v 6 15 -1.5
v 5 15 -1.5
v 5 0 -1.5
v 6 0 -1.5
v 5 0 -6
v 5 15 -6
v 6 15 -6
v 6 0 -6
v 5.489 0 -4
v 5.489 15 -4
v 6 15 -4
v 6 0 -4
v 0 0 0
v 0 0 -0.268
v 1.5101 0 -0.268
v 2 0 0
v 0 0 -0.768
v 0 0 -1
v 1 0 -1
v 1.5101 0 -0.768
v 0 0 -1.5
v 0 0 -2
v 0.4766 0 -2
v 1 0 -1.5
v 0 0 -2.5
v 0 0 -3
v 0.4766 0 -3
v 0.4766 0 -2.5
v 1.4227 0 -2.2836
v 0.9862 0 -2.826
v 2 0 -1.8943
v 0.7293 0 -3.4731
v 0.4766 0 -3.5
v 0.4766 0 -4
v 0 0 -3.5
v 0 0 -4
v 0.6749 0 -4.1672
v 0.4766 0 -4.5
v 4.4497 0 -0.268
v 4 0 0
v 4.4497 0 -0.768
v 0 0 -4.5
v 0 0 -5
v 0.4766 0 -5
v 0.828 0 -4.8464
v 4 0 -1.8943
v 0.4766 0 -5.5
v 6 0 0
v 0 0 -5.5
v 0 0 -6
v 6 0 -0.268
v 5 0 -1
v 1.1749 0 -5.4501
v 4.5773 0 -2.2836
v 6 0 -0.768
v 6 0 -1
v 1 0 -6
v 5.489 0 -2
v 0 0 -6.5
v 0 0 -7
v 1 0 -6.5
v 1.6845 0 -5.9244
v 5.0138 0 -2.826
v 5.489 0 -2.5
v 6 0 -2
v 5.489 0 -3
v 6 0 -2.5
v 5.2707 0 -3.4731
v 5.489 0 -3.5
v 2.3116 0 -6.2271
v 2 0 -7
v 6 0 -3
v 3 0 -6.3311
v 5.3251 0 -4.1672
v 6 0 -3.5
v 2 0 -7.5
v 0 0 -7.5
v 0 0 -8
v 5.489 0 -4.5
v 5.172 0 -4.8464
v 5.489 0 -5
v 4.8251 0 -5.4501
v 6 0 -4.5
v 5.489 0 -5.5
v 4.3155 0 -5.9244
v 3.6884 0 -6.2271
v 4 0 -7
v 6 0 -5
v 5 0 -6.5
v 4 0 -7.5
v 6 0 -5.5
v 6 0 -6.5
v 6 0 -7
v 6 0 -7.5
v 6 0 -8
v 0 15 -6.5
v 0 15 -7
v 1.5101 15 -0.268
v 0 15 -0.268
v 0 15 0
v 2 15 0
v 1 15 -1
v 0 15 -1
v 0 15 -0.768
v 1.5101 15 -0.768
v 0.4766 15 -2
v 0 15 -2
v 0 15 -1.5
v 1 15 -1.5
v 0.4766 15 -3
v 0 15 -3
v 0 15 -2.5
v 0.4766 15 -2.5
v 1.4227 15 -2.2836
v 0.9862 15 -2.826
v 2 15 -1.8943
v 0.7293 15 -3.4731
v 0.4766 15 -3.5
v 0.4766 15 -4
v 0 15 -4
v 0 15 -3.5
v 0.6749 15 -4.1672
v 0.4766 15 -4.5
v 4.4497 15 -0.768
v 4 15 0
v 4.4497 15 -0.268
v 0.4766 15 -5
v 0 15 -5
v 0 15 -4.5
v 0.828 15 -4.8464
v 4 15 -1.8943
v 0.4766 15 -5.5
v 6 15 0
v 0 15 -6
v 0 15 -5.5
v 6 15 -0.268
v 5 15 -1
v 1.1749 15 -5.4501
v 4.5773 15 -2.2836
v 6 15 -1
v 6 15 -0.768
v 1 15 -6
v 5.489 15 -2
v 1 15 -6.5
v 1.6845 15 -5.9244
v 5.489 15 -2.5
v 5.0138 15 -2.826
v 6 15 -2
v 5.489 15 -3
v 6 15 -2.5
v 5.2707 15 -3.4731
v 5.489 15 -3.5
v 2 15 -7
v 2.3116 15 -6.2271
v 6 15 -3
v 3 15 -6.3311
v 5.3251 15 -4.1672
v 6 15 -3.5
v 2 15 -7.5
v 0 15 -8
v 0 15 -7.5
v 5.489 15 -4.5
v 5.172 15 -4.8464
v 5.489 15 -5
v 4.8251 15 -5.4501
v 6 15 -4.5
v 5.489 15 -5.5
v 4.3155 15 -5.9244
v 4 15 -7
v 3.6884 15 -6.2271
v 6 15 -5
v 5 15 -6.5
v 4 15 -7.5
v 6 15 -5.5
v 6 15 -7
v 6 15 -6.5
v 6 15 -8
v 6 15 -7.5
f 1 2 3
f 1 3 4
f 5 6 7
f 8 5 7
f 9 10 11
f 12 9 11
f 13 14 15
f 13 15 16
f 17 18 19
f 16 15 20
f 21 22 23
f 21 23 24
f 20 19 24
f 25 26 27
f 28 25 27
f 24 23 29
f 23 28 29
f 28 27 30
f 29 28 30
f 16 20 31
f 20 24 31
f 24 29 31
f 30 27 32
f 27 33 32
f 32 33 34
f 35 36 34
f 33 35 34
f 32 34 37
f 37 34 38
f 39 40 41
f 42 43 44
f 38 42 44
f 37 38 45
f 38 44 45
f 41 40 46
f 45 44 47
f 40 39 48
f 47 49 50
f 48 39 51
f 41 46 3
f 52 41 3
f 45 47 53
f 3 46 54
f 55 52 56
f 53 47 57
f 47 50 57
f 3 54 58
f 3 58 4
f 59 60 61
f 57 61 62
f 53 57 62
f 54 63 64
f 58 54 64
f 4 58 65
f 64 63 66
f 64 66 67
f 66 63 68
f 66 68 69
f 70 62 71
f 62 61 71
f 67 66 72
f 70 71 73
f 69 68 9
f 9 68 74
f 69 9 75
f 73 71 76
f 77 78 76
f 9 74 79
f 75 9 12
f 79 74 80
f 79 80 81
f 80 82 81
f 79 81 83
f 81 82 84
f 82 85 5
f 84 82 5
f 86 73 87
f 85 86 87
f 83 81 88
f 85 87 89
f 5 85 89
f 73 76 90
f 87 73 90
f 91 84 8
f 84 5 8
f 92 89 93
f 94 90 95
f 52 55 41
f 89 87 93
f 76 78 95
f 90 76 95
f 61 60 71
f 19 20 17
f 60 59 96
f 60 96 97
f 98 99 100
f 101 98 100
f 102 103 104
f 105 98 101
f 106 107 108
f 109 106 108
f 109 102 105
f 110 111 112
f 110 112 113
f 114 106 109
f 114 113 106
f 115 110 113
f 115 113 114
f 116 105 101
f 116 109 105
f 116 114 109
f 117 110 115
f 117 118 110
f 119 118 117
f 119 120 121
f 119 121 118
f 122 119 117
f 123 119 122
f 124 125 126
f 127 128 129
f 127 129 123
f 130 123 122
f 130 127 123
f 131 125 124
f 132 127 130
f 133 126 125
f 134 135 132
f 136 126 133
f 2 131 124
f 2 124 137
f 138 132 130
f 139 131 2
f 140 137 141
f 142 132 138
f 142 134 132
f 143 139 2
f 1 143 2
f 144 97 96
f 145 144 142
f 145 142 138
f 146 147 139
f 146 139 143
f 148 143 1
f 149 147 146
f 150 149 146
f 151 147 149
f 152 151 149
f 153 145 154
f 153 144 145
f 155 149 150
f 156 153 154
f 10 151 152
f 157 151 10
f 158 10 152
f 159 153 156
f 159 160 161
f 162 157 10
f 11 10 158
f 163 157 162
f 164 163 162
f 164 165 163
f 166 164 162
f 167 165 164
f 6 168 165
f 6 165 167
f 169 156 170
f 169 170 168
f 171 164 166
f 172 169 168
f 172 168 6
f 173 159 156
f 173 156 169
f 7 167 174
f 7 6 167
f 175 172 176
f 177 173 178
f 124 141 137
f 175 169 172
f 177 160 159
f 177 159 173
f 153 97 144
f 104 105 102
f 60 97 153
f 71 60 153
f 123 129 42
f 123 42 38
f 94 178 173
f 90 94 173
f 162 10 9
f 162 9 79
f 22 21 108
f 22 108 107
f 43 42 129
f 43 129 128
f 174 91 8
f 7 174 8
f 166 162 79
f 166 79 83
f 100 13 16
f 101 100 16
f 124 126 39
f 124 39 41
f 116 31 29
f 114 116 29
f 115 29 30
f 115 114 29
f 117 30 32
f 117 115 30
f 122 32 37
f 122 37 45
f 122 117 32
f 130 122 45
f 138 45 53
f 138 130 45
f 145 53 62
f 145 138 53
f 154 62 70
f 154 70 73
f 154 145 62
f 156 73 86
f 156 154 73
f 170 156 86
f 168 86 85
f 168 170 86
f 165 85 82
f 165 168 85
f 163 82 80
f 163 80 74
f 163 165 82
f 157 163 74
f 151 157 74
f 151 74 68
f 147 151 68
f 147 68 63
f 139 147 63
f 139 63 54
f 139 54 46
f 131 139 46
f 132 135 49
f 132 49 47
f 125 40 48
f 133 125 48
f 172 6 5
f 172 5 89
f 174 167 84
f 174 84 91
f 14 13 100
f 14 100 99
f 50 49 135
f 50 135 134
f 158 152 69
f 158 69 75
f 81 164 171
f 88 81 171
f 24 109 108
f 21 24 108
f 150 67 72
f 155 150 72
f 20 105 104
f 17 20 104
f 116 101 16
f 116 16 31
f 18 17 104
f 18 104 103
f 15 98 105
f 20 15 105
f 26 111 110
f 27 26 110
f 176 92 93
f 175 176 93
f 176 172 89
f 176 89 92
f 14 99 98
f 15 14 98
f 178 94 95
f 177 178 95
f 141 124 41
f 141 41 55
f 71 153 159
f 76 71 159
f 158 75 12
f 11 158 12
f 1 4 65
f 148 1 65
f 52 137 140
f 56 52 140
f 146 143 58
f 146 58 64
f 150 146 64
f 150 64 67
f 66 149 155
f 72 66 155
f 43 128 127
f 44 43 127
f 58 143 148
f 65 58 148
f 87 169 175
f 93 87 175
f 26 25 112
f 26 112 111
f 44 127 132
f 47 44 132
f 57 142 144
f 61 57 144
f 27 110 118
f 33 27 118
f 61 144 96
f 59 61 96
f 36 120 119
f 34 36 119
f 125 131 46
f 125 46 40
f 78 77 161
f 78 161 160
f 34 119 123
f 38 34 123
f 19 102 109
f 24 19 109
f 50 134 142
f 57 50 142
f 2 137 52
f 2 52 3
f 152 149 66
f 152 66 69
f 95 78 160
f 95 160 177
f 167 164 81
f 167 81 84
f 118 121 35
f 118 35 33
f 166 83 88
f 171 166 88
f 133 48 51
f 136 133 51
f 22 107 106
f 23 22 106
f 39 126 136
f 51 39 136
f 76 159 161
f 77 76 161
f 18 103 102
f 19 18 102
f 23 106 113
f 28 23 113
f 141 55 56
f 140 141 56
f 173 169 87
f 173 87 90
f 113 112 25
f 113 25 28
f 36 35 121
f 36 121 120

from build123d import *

# Parameters (mm, degrees)
SKETCH1_W           = 6
SKETCH1_H           = 8
BOSS_EXTRUDE1_DEPTH = 15
CUT_EXTRUDE2_DEPTH  = 15
SKETCH3_W           = 1.55025835
SKETCH3_H           = 0.5
SKETCH3_W_2         = 0.44974165
SKETCH3_W_3         = 1
SKETCH3_W_4         = 0.511037603
SKETCH3_W_5         = 1.033479195
SKETCH3_W_6         = 0.476588297
SKETCH3_W_7         = 0.523411703
SKETCH3_W_8         = 0.489932508
CUT_EXTRUDE3_DEPTH  = 15


with BuildPart() as part:
    # Sketch1 → Boss-Extrude1 (new body)
    with BuildSketch(Plane(origin=(0, 0, 0), x_dir=(1, 0, 0), z_dir=(0, 1, 0))):
        with Locations((3, 4)):
            Rectangle(SKETCH1_W, SKETCH1_H)
    extrude(amount=BOSS_EXTRUDE1_DEPTH)

    # Sketch2 → Cut-Extrude2 (cut)
    with BuildSketch(Plane(origin=(0, 15, 0), x_dir=(1, 0, 0), z_dir=(0, 1, 0))):
        with BuildLine():
            Line((4, 0), (2, 0))
            Line((2, 0), (2, 1.894320503))
            ThreePointArc((2, 1.894320503), (3, 6.331069742), (4, 1.894320503))
            Line((4, 1.894320503), (4, 0))
        make_face()
    extrude(amount=-CUT_EXTRUDE2_DEPTH, mode=Mode.SUBTRACT)

    # Sketch3 → Cut-Extrude3 (cut)
    with BuildSketch(Plane(origin=(0, 15, 0), x_dir=(1, 0, 0), z_dir=(0, 1, 0))):
        with Locations((5.224870825, 7.25)):
            Rectangle(SKETCH3_W, SKETCH3_H)
        with Locations((4.224870825, 7.25)):
            Rectangle(SKETCH3_W_2, SKETCH3_H)
        with Locations((5.5, 6.25)):
            Rectangle(SKETCH3_W_3, SKETCH3_H)
        with Locations((5.744481199, 5.25)):
            Rectangle(SKETCH3_W_4, SKETCH3_H)
        with Locations((5.744481199, 4.25)):
            Rectangle(SKETCH3_W_4, SKETCH3_H)
        with Locations((5.744481199, 3.25)):
            Rectangle(SKETCH3_W_4, SKETCH3_H)
        with Locations((5.744481199, 2.25)):
            Rectangle(SKETCH3_W_4, SKETCH3_H)
        with Locations((5.5, 1.25)):
            Rectangle(SKETCH3_W_3, SKETCH3_H)
        with Locations((5.224870825, 0.517991792)):
            Rectangle(SKETCH3_W, SKETCH3_H)
        with Locations((0.993327895, 0.517991792)):
            Rectangle(SKETCH3_W_5, SKETCH3_H)
        with Locations((0.238294149, 0.517991792)):
            Rectangle(SKETCH3_W_6, SKETCH3_H)
        with Locations((0.238294149, 1.25)):
            Rectangle(SKETCH3_W_6, SKETCH3_H)
        with Locations((0.738294149, 1.25)):
            Rectangle(SKETCH3_W_7, SKETCH3_H)
        with Locations((0.238294149, 2.25)):
            Rectangle(SKETCH3_W_6, SKETCH3_H)
        with Locations((0.238294149, 3.25)):
            Rectangle(SKETCH3_W_6, SKETCH3_H)
        with Locations((0.238294149, 4.25)):
            Rectangle(SKETCH3_W_6, SKETCH3_H)
        with Locations((0.238294149, 5.25)):
            Rectangle(SKETCH3_W_6, SKETCH3_H)
        with Locations((0.238294149, 6.25)):
            Rectangle(SKETCH3_W_6, SKETCH3_H)
        with Locations((0.993327895, 7.25)):
            Rectangle(SKETCH3_W_5, SKETCH3_H)
        with Locations((0.238294149, 7.25)):
            Rectangle(SKETCH3_W_6, SKETCH3_H)
        with Locations((1.755033746, 7.25)):
            Rectangle(SKETCH3_W_8, SKETCH3_H)
        with Locations((0.738294149, 6.25)):
            Rectangle(SKETCH3_W_7, SKETCH3_H)
    extrude(amount=-CUT_EXTRUDE3_DEPTH, mode=Mode.SUBTRACT)


solid = part.part
